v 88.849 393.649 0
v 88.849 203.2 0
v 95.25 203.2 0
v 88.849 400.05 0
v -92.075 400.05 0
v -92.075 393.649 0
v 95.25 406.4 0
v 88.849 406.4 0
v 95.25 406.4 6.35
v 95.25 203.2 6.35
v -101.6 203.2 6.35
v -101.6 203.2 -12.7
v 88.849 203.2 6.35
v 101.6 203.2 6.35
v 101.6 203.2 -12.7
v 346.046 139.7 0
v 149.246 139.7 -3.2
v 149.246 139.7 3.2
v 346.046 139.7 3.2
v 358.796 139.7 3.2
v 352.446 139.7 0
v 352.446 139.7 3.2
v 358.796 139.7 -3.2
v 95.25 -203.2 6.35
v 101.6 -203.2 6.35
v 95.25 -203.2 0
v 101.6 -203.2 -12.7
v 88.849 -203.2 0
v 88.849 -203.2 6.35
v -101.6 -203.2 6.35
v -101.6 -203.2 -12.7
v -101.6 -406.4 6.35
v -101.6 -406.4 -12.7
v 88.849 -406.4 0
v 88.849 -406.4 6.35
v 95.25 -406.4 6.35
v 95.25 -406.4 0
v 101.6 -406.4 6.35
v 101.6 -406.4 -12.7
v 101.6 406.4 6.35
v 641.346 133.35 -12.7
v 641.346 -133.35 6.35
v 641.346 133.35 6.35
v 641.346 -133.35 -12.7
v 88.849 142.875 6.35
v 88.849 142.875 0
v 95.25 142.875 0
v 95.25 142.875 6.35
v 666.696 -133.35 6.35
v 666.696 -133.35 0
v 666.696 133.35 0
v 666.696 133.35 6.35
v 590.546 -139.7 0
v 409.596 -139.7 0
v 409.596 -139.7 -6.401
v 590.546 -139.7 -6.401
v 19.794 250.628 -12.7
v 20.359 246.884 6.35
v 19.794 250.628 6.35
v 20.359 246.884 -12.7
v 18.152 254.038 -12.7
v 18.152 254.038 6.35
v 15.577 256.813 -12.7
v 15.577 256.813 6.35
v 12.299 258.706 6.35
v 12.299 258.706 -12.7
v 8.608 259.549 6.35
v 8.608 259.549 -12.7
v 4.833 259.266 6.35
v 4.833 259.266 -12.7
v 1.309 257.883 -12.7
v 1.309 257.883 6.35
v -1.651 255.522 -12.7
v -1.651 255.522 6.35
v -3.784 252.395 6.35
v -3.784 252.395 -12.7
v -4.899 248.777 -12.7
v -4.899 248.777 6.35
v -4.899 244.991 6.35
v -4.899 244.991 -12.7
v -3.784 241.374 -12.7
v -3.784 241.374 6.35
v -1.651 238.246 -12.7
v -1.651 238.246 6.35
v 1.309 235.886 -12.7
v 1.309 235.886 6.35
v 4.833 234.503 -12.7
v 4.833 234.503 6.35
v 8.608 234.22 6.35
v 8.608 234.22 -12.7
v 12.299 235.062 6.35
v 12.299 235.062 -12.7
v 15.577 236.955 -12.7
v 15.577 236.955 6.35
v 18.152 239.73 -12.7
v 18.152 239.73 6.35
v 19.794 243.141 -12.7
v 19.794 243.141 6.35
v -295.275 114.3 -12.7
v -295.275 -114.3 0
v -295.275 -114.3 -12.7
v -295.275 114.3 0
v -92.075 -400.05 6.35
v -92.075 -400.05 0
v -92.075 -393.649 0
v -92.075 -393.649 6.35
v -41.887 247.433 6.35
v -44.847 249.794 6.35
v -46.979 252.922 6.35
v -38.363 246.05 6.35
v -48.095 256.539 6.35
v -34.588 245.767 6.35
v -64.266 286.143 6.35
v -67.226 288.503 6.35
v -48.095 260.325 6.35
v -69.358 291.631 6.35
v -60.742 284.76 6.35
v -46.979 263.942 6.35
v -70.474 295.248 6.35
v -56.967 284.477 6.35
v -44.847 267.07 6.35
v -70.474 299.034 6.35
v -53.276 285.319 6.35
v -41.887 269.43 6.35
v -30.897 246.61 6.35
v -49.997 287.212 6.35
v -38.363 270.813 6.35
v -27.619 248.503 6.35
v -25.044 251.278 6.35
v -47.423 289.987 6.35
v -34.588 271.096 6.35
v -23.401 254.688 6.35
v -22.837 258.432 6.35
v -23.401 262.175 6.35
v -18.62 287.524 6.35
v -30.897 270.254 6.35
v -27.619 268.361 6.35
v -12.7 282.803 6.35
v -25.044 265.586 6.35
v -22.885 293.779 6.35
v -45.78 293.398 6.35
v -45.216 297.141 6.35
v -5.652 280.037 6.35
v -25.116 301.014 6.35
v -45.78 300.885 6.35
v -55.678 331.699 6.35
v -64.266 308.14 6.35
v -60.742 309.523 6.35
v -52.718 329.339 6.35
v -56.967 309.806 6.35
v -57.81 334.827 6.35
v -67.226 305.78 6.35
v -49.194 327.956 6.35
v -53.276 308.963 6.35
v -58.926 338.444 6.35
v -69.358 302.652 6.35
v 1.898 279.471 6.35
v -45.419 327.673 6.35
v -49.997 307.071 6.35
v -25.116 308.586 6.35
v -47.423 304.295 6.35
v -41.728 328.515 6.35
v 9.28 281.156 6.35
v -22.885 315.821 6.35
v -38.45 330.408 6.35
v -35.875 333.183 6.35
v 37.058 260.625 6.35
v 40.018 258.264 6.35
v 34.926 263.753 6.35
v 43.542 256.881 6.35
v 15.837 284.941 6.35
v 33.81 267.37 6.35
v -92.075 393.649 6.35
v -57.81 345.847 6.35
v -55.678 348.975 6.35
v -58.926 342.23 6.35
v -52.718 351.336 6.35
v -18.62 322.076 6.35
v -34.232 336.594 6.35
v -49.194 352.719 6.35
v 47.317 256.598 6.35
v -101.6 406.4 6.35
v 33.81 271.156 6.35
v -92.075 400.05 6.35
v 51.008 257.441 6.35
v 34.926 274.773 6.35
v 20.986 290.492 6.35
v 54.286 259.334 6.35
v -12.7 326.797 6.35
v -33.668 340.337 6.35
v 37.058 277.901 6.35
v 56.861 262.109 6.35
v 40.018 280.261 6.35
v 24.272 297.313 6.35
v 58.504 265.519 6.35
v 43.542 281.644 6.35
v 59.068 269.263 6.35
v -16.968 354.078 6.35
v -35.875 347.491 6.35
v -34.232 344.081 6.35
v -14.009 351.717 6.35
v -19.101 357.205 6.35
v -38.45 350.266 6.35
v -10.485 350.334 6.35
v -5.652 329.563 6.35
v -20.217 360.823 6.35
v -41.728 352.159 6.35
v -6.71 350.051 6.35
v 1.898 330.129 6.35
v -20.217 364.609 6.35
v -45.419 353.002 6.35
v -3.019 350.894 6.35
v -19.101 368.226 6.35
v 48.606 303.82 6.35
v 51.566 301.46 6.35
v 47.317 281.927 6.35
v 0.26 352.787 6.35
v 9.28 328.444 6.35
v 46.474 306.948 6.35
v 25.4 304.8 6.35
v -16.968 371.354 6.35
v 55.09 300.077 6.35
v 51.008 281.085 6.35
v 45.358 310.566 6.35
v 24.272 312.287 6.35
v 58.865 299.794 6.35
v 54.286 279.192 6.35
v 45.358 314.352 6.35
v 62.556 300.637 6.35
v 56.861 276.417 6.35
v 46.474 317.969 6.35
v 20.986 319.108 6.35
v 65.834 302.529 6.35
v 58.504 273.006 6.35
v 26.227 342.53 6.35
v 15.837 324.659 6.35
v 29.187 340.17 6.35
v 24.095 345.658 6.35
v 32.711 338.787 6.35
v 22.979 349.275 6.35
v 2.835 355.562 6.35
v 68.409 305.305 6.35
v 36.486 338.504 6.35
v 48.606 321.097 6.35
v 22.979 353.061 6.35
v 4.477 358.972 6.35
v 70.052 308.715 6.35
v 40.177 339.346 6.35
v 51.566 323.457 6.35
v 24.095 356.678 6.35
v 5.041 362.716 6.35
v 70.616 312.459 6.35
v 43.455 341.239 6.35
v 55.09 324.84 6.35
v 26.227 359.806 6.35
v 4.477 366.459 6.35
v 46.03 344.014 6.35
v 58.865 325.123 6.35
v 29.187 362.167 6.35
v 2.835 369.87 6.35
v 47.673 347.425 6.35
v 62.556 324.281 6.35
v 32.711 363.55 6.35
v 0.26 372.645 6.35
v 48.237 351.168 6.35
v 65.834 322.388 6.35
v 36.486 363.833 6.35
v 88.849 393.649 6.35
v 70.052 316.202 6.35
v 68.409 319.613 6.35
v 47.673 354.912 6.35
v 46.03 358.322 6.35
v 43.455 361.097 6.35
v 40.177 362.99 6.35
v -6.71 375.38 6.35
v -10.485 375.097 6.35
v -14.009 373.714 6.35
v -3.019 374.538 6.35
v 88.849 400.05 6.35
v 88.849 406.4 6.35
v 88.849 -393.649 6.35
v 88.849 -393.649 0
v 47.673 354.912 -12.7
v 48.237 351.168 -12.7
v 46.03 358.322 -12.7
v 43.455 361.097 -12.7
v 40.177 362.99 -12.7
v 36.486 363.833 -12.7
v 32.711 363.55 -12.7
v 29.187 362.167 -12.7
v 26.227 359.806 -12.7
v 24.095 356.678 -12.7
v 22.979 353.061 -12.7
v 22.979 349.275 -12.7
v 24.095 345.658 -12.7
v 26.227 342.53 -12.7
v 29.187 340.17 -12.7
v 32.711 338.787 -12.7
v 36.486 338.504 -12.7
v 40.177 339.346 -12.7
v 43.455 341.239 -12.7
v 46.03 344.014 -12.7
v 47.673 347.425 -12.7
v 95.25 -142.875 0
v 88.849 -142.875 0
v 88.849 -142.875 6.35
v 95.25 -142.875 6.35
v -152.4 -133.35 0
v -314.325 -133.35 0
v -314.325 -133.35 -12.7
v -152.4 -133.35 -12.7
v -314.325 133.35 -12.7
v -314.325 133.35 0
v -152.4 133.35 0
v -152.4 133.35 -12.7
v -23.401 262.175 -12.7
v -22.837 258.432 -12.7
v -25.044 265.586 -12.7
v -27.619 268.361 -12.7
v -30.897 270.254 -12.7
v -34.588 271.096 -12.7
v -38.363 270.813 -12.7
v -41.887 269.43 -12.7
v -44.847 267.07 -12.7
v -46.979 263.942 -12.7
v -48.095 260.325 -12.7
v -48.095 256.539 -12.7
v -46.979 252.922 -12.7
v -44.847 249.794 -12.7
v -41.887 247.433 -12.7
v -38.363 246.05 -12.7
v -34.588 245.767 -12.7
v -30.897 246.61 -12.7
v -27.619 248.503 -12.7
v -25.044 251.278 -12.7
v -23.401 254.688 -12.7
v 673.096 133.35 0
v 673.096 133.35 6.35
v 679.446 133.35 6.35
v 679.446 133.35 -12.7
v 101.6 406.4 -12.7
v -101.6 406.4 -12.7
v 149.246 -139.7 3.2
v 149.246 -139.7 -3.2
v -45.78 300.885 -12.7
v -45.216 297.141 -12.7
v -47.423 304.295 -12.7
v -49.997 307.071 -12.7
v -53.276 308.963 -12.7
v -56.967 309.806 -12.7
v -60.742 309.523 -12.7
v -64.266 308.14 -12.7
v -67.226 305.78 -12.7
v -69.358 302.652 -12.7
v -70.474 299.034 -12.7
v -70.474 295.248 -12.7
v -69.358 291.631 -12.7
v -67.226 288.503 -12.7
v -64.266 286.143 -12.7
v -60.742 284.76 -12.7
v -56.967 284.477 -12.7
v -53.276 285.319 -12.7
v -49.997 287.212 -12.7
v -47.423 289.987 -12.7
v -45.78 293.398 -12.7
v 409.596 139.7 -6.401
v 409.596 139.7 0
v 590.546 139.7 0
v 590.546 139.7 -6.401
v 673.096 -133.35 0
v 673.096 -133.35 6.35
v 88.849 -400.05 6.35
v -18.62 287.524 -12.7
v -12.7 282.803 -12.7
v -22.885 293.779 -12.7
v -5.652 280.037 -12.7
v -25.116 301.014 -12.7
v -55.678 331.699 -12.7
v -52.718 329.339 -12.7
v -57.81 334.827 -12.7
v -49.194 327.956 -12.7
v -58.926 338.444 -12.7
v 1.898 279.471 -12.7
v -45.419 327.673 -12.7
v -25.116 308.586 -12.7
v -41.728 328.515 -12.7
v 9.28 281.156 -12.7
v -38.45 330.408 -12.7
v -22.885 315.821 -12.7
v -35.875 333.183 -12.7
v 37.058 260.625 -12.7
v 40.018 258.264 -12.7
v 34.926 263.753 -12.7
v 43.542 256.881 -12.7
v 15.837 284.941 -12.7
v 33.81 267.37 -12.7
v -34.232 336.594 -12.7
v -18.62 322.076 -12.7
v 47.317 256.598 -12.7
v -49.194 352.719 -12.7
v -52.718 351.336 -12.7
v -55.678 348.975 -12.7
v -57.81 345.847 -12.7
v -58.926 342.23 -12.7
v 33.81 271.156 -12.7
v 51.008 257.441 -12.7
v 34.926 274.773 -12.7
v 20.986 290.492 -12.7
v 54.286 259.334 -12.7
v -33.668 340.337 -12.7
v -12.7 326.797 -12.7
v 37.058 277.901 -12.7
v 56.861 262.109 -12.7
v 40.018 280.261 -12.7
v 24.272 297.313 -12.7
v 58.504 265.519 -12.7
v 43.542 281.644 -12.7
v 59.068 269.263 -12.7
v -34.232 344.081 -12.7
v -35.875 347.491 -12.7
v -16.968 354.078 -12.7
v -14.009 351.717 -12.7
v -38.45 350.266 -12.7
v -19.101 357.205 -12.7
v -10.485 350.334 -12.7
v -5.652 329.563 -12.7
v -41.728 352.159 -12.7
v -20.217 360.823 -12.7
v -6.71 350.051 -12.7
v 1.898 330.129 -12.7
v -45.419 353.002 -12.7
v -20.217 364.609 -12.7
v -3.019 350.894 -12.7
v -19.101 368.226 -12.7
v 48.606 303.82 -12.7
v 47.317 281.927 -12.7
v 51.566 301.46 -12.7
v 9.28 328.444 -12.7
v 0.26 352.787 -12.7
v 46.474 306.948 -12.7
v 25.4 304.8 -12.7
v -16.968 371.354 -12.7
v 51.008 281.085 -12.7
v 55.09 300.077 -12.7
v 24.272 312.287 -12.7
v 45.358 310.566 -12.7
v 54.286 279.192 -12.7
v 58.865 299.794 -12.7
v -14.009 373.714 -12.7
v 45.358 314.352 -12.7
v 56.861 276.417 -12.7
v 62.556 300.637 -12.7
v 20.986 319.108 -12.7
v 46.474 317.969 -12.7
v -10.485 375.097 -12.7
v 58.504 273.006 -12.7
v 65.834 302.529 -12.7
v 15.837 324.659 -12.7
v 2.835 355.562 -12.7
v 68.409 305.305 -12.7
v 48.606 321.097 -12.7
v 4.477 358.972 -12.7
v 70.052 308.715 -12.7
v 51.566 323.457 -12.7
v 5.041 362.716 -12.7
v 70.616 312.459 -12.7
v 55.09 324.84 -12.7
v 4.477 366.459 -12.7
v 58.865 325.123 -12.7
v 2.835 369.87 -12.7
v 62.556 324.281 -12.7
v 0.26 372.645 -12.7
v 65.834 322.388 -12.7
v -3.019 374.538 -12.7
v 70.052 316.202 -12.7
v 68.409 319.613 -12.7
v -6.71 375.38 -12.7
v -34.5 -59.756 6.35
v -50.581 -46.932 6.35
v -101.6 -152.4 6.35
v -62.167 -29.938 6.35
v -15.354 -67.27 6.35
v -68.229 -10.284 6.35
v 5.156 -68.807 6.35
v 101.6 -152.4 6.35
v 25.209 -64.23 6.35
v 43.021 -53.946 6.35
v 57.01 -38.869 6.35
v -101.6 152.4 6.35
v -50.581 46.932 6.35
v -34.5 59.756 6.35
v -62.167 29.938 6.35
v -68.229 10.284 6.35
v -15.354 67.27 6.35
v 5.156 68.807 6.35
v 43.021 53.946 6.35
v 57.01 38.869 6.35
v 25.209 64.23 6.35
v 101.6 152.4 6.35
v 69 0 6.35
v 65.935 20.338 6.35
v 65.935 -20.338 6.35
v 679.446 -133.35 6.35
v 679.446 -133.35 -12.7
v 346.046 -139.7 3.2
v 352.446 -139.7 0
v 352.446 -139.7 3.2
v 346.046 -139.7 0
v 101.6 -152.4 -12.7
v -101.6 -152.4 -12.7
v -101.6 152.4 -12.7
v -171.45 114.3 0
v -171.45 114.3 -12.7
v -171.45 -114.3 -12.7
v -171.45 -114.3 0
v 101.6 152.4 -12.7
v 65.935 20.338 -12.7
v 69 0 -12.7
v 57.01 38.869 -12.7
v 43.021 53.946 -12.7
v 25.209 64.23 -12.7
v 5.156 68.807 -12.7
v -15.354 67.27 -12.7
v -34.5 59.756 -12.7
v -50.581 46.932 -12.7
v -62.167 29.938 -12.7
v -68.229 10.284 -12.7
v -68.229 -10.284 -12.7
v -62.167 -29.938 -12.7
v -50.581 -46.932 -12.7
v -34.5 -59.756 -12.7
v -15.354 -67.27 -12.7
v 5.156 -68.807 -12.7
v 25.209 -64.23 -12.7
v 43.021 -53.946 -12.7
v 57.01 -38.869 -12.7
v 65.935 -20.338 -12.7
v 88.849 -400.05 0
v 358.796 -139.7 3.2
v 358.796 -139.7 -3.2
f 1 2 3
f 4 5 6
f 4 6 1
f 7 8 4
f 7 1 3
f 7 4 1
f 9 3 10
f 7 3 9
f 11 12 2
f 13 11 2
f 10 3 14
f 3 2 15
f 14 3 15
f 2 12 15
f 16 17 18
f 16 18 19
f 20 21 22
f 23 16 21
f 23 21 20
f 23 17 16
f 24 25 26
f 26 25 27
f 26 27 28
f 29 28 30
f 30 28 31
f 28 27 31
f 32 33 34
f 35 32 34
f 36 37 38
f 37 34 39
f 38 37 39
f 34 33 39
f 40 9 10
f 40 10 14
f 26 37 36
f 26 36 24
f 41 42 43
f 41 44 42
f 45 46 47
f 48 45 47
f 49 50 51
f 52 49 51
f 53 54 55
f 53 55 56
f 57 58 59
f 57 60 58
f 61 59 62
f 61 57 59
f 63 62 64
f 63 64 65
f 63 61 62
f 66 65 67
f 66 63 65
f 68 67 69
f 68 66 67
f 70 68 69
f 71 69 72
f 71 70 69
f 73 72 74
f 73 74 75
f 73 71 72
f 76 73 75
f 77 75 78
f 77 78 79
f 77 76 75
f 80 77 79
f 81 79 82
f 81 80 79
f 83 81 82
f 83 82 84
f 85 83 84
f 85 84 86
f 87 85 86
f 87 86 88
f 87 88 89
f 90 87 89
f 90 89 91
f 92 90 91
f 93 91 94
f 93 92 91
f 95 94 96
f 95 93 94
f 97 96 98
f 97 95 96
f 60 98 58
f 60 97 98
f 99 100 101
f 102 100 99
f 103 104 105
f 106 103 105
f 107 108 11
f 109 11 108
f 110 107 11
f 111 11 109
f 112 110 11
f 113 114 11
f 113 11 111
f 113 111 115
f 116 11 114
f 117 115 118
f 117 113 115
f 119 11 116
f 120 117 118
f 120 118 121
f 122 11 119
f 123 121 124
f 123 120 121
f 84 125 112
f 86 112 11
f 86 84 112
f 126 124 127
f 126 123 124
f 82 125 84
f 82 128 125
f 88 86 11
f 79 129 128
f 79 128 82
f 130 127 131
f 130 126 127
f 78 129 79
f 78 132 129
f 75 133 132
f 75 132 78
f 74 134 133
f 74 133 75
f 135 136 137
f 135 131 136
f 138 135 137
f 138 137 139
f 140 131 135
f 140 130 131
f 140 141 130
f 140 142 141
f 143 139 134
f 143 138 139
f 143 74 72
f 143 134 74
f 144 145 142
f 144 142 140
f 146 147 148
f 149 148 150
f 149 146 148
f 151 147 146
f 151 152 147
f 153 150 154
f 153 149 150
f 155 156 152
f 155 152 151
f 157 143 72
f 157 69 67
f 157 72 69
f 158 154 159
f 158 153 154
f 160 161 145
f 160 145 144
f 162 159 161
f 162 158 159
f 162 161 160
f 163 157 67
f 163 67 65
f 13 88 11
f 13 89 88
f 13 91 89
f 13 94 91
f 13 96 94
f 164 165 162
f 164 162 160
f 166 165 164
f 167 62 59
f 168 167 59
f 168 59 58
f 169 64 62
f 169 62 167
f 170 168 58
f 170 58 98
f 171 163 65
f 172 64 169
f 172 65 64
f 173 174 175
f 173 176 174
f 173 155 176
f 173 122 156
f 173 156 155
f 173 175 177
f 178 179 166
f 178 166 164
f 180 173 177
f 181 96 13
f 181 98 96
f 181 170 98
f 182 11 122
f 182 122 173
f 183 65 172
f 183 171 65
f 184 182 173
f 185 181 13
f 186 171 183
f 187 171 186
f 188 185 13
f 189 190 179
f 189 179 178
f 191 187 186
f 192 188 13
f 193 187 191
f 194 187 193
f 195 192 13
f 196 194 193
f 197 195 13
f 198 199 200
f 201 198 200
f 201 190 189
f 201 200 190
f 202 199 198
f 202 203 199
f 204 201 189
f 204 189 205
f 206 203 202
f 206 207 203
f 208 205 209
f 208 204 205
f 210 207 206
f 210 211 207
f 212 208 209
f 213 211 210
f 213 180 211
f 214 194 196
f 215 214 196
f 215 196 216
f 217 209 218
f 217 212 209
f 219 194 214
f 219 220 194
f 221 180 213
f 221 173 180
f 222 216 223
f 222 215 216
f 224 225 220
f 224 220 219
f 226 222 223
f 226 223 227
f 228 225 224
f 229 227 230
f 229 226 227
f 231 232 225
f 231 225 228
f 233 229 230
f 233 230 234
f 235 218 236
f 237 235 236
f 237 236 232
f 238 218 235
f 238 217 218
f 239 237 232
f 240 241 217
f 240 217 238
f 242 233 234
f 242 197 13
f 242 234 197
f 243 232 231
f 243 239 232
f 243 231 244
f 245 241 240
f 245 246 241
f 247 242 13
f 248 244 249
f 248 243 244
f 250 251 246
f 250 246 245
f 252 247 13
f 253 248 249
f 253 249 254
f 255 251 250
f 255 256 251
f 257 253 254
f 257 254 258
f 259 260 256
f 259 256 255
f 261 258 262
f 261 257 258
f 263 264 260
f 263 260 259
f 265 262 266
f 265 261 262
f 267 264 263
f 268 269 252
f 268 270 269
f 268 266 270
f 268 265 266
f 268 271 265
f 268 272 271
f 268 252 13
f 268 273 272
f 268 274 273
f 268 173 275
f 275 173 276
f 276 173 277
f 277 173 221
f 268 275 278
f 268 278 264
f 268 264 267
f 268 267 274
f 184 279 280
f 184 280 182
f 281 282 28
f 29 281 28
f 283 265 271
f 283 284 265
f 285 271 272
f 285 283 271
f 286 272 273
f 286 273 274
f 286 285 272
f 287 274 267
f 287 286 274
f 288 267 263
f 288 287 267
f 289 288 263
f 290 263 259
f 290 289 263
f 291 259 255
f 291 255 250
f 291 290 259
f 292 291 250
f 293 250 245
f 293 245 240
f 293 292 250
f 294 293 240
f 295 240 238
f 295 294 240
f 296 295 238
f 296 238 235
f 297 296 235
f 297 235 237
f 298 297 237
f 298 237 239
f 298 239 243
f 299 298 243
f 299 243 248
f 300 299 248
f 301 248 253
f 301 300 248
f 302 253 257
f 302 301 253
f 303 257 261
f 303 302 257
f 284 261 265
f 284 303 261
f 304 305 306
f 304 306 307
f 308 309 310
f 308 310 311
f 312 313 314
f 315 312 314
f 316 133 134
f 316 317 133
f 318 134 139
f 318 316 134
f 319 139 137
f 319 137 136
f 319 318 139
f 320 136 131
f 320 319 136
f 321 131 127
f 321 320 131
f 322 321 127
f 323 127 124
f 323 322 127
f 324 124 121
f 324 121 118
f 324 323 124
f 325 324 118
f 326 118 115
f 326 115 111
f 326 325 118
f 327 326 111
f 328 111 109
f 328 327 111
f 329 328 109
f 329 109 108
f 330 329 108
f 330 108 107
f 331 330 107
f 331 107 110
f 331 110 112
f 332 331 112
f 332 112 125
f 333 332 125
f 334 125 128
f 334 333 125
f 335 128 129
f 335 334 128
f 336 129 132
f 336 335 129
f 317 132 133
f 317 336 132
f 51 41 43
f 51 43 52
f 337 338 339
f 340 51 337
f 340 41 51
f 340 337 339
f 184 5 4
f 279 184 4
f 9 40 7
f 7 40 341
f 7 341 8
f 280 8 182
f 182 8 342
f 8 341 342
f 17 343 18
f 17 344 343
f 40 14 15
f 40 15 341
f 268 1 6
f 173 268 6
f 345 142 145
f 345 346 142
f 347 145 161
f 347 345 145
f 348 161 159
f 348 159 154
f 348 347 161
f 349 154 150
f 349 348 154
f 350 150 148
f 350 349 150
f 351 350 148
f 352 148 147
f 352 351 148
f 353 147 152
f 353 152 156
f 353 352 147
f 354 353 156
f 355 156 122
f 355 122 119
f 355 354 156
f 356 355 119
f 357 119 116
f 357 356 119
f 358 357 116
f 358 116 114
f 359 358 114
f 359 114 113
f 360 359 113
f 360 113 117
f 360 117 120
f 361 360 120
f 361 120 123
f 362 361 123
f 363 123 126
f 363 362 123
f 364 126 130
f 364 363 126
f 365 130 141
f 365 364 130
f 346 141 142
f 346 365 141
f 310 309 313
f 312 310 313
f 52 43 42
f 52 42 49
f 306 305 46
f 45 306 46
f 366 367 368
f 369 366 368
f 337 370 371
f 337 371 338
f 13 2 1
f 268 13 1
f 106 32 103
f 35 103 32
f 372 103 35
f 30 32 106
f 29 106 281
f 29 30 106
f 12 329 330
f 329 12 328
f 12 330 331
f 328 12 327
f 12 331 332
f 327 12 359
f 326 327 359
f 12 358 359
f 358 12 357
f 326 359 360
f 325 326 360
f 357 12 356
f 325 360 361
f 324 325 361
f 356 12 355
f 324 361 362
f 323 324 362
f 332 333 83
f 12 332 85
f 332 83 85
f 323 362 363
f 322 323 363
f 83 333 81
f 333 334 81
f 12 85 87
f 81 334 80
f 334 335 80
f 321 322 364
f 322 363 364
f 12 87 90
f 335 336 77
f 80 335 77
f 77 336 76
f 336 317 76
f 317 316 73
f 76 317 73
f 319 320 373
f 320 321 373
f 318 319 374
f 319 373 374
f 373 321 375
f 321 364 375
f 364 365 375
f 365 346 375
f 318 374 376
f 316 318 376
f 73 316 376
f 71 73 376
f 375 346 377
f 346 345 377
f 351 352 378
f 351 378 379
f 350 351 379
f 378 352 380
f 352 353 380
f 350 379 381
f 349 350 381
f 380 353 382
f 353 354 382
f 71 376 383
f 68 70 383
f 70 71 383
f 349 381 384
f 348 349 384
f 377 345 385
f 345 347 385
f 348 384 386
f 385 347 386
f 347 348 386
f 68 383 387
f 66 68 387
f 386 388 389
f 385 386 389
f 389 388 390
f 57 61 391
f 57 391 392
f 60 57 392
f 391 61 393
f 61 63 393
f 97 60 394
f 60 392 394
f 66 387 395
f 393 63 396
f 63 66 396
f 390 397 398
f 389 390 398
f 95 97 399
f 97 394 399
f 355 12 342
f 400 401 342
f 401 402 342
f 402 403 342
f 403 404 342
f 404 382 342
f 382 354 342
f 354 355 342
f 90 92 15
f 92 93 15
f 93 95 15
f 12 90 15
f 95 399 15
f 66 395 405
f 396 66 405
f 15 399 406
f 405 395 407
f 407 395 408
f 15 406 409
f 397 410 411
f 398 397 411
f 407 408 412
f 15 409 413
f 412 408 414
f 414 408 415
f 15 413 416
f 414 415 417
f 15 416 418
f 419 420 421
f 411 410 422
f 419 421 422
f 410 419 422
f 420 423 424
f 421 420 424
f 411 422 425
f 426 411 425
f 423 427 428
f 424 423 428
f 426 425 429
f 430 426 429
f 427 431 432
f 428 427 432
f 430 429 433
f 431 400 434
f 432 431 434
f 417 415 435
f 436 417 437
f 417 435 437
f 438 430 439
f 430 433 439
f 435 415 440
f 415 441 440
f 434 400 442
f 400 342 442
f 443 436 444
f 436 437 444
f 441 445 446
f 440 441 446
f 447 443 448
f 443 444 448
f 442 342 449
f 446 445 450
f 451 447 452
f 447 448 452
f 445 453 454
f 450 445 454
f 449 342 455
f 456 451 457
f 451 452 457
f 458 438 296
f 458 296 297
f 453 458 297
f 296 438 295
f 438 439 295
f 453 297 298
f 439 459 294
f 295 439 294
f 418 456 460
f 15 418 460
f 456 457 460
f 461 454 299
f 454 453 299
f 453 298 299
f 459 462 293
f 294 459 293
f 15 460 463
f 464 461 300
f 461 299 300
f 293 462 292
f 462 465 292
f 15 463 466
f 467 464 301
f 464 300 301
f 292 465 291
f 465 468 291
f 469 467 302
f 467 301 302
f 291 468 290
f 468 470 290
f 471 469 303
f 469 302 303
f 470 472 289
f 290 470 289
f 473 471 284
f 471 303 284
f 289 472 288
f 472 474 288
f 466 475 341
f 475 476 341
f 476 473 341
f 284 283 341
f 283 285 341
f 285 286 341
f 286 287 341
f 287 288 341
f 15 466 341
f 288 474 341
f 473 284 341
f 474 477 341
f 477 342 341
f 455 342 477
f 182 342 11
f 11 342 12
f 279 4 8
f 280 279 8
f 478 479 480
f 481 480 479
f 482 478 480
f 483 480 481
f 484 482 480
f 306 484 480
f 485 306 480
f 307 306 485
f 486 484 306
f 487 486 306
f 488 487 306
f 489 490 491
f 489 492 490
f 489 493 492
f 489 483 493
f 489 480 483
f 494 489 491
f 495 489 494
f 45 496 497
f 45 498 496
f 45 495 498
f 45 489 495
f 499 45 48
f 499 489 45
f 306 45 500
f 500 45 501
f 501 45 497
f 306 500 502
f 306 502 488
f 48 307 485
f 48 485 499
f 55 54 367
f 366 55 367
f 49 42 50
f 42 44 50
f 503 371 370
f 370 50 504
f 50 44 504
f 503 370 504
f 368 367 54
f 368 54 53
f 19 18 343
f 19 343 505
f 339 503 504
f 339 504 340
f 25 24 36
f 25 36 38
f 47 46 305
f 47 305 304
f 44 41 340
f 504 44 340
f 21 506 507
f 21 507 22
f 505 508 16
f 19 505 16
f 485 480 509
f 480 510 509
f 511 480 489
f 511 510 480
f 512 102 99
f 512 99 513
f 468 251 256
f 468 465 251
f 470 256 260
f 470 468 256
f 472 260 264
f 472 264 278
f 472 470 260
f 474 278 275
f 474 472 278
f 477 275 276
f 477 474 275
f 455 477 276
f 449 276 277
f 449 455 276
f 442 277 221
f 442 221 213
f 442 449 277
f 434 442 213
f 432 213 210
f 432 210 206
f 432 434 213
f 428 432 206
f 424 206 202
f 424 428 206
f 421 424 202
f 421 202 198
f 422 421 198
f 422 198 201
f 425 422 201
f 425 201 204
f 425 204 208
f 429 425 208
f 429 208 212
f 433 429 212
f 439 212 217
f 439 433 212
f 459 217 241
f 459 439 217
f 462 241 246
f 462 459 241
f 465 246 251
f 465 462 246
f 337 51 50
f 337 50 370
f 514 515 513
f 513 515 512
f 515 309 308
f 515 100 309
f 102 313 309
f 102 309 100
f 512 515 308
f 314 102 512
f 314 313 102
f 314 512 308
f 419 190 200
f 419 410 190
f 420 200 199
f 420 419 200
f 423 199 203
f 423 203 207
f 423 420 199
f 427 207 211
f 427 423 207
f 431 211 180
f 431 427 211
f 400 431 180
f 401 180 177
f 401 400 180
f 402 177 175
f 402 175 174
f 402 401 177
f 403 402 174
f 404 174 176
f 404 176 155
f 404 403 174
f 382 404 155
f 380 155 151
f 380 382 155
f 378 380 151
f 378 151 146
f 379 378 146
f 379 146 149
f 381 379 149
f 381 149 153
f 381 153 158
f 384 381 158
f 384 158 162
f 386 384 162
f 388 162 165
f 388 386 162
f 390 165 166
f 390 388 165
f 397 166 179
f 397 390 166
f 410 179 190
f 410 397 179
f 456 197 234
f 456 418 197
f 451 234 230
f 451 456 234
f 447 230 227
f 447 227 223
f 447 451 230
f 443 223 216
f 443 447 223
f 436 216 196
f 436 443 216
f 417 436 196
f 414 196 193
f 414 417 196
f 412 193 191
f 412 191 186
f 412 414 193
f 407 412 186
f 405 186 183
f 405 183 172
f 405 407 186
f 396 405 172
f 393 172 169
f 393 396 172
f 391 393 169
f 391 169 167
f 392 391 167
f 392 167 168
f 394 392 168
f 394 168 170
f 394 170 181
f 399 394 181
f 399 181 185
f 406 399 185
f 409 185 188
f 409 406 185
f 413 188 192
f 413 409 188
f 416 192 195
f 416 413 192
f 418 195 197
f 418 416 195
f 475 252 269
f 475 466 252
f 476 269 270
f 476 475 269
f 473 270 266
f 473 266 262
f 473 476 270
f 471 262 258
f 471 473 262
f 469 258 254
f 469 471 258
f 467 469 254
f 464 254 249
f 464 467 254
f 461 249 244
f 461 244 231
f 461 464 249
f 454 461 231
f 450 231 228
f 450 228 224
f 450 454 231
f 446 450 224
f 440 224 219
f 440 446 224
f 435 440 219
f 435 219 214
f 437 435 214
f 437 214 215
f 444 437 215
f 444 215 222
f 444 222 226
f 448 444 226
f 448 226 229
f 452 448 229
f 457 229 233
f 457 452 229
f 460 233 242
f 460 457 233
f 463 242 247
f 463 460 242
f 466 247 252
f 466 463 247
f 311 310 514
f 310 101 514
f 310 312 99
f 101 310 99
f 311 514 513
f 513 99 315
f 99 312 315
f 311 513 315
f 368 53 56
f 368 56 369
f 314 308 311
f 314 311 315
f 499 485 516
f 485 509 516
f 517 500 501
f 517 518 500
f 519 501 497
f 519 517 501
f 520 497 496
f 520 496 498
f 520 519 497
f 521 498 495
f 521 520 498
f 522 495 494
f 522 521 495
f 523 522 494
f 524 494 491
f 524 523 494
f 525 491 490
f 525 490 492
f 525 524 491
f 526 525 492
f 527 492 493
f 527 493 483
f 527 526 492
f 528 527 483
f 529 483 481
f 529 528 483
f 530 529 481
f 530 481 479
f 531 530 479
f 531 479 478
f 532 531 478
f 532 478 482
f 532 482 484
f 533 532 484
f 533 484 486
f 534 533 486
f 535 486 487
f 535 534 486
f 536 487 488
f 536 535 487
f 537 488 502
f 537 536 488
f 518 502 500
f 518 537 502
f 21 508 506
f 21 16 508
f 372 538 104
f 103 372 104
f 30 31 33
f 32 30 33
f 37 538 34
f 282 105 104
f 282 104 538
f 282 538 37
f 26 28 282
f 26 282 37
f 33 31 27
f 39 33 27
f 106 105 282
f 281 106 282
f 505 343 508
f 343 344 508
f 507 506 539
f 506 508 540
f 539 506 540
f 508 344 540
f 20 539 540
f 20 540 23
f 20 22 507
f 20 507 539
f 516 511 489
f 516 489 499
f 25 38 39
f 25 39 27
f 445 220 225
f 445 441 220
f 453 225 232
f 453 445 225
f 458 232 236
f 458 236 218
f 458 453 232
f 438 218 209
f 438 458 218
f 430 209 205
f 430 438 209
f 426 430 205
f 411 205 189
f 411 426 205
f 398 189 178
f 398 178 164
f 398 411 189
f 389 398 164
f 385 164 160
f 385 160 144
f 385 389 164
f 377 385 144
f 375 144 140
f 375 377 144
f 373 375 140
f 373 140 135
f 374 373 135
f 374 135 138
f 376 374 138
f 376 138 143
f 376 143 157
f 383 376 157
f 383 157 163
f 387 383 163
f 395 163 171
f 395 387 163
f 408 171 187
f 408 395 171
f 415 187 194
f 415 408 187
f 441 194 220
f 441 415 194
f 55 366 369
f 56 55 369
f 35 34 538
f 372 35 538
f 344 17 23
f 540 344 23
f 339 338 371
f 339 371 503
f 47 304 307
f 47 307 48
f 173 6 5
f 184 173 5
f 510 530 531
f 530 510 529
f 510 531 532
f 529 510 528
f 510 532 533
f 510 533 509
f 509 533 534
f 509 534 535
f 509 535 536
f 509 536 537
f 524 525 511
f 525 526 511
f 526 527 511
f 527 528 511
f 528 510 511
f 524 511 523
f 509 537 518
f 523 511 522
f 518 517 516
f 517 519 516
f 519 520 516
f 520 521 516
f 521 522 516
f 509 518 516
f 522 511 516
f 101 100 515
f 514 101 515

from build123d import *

# Parameters (mm, degrees)
F0_W      = 203.2
F0_H      = 304.8
F0_R      = 69
F0_W_2    = 6.4008
F0_H_2    = 285.75
F1_DEPTH  = 12.7
F2_DEPTH  = 6.35
F3_W      = 6.35
F3_H      = 203.2
F3_W_2    = 180.9242
F3_H_2    = 6.4008
F3_W_3    = 2.6920977338
F4_DEPTH  = 12.7
F5_DEPTH  = 6.35
F6_W      = 6.35
F6_H      = 203.2
F6_R      = 12.7
F6_R_2    = 25.4
F6_W_2    = 180.9242
F6_H_2    = 6.4008
F6_W_3    = 3.0305701597
F7_DEPTH  = 12.7
F8_DEPTH  = 6.35
F9_W      = 6.35
F9_H      = 279.4
F9_W_2    = 6.4008
F9_W_3    = 196.7992
F10_DEPTH = 3.2
F11_W     = 161.925
F11_H     = 266.7
F11_W_2   = 123.825
F11_H_2   = 228.6
F12_DEPTH = 12.7
F13_DEPTH = 3.2
F14_W     = 180.95000005
F14_H     = 279.4
F15_DEPTH = 6.4008
F16_W     = 25.3492
F16_H     = 266.7
F16_W_2   = 6.4008
F16_W_3   = 6.35
F17_DEPTH = 12.7
F18_DEPTH = 6.35


with BuildPart() as f1:
    # F0 (on Top) → F1 (new body)
    with BuildSketch(Plane.XY):
        Rectangle(F0_W, F0_H)
        Circle(F0_R, mode=Mode.SUBTRACT)
        with Locations((92.0496, 0)):
            Rectangle(F0_W_2, F0_H_2, mode=Mode.SUBTRACT)
        with Locations((92.0496, 0)):
            Rectangle(F0_W_2, F0_H_2)
    extrude(amount=-F1_DEPTH)

    # F0 (on Top) → F2 (join)
    with BuildSketch(Plane.XY):
        Rectangle(F0_W, F0_H)
        Circle(F0_R, mode=Mode.SUBTRACT)
        with Locations((92.0496, 0)):
            Rectangle(F0_W_2, F0_H_2, mode=Mode.SUBTRACT)
    extrude(amount=F2_DEPTH)


with BuildPart() as f4:
    # F3 (on Top) → F4 (new body)
    with BuildSketch(Plane.XY):
        with Locations((98.425, -304.8)):
            Rectangle(F3_W, F3_H)
        Polygon((88.8492, -406.4), (95.25, -406.4), (95.25, -203.2), (88.8492, -203.2), (88.8492, -393.6492), (91.5412977338, -393.6492), (91.5412977338, -400.05), (88.8492, -400.05), align=None)
        Polygon((-101.6, -406.4), (88.8492, -406.4), (88.8492, -400.05), (-92.075, -400.05), (-92.075, -393.6492), (88.8492, -393.6492), (88.8492, -203.2), (-101.6, -203.2), align=None)
        with Locations((-1.6129, -396.8496)):
            Rectangle(F3_W_2, F3_H_2)
        with Locations((90.1952488669, -396.8496)):
            Rectangle(F3_W_3, F3_H_2)
    extrude(amount=-F4_DEPTH)

    # F3 (on Top) → F5 (join)
    with BuildSketch(Plane.XY):
        Polygon((-101.6, -406.4), (88.8492, -406.4), (88.8492, -400.05), (-92.075, -400.05), (-92.075, -393.6492), (88.8492, -393.6492), (88.8492, -203.2), (-101.6, -203.2), align=None)
        with Locations((98.425, -304.8)):
            Rectangle(F3_W, F3_H)
    extrude(amount=F5_DEPTH)


with BuildPart() as f7:
    # F6 (on Top) → F7 (new body)
    with BuildSketch(Plane.XY):
        with Locations((98.425, 304.8)):
            Rectangle(F6_W, F6_H)
        Polygon((88.8492, 203.2), (95.25, 203.2), (95.25, 406.4), (88.8492, 406.4), (88.8492, 400.05), (91.8797701597, 400.05), (91.8797701597, 393.6492), (88.8492, 393.6492), align=None)
        Polygon((-101.6, 203.2), (88.8492, 203.2), (88.8492, 393.6492), (-92.075, 393.6492), (-92.075, 400.05), (88.8492, 400.05), (88.8492, 406.4), (-101.6, 406.4), align=None)
        with Locations((-57.9158084915, 297.1413103751)):
            Circle(F6_R, mode=Mode.SUBTRACT)
        with Locations((-35.5371495535, 258.431827709)):
            Circle(F6_R, mode=Mode.SUBTRACT)
        with Locations((7.6586896249, 246.8841915085)):
            Circle(F6_R, mode=Mode.SUBTRACT)
        with Locations((46.368172291, 269.2628504465)):
            Circle(F6_R, mode=Mode.SUBTRACT)
        with Locations((0, 304.8)):
            Circle(F6_R_2, mode=Mode.SUBTRACT)
        with Locations((-46.368172291, 340.3371495535)):
            Circle(F6_R, mode=Mode.SUBTRACT)
        with Locations((-7.6586896249, 362.7158084915)):
            Circle(F6_R, mode=Mode.SUBTRACT)
        with Locations((35.5371495535, 351.168172291)):
            Circle(F6_R, mode=Mode.SUBTRACT)
        with Locations((57.9158084915, 312.4586896249)):
            Circle(F6_R, mode=Mode.SUBTRACT)
        with Locations((-1.6129, 396.8496)):
            Rectangle(F6_W_2, F6_H_2)
        with Locations((90.3644850799, 396.8496)):
            Rectangle(F6_W_3, F6_H_2)
    extrude(amount=-F7_DEPTH)

    # F6 (on Top) → F8 (join)
    with BuildSketch(Plane.XY):
        Polygon((-101.6, 203.2), (88.8492, 203.2), (88.8492, 393.6492), (-92.075, 393.6492), (-92.075, 400.05), (88.8492, 400.05), (88.8492, 406.4), (-101.6, 406.4), align=None)
        with Locations((-57.9158084915, 297.1413103751)):
            Circle(F6_R, mode=Mode.SUBTRACT)
        with Locations((-35.5371495535, 258.431827709)):
            Circle(F6_R, mode=Mode.SUBTRACT)
        with Locations((7.6586896249, 246.8841915085)):
            Circle(F6_R, mode=Mode.SUBTRACT)
        with Locations((46.368172291, 269.2628504465)):
            Circle(F6_R, mode=Mode.SUBTRACT)
        with Locations((0, 304.8)):
            Circle(F6_R_2, mode=Mode.SUBTRACT)
        with Locations((-46.368172291, 340.3371495535)):
            Circle(F6_R, mode=Mode.SUBTRACT)
        with Locations((-7.6586896249, 362.7158084915)):
            Circle(F6_R, mode=Mode.SUBTRACT)
        with Locations((35.5371495535, 351.168172291)):
            Circle(F6_R, mode=Mode.SUBTRACT)
        with Locations((57.9158084915, 312.4586896249)):
            Circle(F6_R, mode=Mode.SUBTRACT)
        with Locations((98.425, 304.8)):
            Rectangle(F6_W, F6_H)
    extrude(amount=F8_DEPTH)


with BuildPart() as f10:
    # F9 (on Top) → F10 (new body)
    with BuildSketch(Plane.XY):
        with Locations((355.6214746066, 0)):
            Rectangle(F9_W, F9_H)
        with Locations((349.2460746066, 0)):
            Rectangle(F9_W_2, F9_H)
        with Locations((247.6460746066, 0)):
            Rectangle(F9_W_3, F9_H)
    extrude(amount=-F10_DEPTH)

    # F9 (on Top) → F13 (join)
    with BuildSketch(Plane.XY):
        with Locations((247.6460746066, 0)):
            Rectangle(F9_W_3, F9_H)
        with Locations((355.6214746066, 0)):
            Rectangle(F9_W, F9_H)
    extrude(amount=F13_DEPTH)


with BuildPart() as f12:
    # F11 (on Top) → F12 (new body)
    with BuildSketch(Plane.XY):
        with Locations((-233.3625, 0)):
            Rectangle(F11_W, F11_H)
        with Locations((-233.3625, 0)):
            Rectangle(F11_W_2, F11_H_2, mode=Mode.SUBTRACT)
    extrude(amount=-F12_DEPTH)


with BuildPart() as f15:
    # F14 (on Top) → F15 (new body)
    with BuildSketch(Plane.XY):
        with Locations((500.0714746316, 0)):
            Rectangle(F14_W, F14_H)
    extrude(amount=-F15_DEPTH)


with BuildPart() as f17:
    # F16 (on face) → F17 (new body)
    with BuildSketch(Plane.XY):
        with Locations((654.0210746566, 0)):
            Rectangle(F16_W, F16_H)
        with Locations((669.8960746566, 0)):
            Rectangle(F16_W_2, F16_H)
        with Locations((676.2714746566, 0)):
            Rectangle(F16_W_3, F16_H)
    extrude(amount=-F17_DEPTH)

    # F16 (on face) → F18 (join)
    with BuildSketch(Plane.XY):
        with Locations((654.0210746566, 0)):
            Rectangle(F16_W, F16_H)
        with Locations((676.2714746566, 0)):
            Rectangle(F16_W_3, F16_H)
    extrude(amount=F18_DEPTH)


solid = Compound([f1.part, f4.part, f7.part, f10.part, f12.part, f15.part, f17.part])
